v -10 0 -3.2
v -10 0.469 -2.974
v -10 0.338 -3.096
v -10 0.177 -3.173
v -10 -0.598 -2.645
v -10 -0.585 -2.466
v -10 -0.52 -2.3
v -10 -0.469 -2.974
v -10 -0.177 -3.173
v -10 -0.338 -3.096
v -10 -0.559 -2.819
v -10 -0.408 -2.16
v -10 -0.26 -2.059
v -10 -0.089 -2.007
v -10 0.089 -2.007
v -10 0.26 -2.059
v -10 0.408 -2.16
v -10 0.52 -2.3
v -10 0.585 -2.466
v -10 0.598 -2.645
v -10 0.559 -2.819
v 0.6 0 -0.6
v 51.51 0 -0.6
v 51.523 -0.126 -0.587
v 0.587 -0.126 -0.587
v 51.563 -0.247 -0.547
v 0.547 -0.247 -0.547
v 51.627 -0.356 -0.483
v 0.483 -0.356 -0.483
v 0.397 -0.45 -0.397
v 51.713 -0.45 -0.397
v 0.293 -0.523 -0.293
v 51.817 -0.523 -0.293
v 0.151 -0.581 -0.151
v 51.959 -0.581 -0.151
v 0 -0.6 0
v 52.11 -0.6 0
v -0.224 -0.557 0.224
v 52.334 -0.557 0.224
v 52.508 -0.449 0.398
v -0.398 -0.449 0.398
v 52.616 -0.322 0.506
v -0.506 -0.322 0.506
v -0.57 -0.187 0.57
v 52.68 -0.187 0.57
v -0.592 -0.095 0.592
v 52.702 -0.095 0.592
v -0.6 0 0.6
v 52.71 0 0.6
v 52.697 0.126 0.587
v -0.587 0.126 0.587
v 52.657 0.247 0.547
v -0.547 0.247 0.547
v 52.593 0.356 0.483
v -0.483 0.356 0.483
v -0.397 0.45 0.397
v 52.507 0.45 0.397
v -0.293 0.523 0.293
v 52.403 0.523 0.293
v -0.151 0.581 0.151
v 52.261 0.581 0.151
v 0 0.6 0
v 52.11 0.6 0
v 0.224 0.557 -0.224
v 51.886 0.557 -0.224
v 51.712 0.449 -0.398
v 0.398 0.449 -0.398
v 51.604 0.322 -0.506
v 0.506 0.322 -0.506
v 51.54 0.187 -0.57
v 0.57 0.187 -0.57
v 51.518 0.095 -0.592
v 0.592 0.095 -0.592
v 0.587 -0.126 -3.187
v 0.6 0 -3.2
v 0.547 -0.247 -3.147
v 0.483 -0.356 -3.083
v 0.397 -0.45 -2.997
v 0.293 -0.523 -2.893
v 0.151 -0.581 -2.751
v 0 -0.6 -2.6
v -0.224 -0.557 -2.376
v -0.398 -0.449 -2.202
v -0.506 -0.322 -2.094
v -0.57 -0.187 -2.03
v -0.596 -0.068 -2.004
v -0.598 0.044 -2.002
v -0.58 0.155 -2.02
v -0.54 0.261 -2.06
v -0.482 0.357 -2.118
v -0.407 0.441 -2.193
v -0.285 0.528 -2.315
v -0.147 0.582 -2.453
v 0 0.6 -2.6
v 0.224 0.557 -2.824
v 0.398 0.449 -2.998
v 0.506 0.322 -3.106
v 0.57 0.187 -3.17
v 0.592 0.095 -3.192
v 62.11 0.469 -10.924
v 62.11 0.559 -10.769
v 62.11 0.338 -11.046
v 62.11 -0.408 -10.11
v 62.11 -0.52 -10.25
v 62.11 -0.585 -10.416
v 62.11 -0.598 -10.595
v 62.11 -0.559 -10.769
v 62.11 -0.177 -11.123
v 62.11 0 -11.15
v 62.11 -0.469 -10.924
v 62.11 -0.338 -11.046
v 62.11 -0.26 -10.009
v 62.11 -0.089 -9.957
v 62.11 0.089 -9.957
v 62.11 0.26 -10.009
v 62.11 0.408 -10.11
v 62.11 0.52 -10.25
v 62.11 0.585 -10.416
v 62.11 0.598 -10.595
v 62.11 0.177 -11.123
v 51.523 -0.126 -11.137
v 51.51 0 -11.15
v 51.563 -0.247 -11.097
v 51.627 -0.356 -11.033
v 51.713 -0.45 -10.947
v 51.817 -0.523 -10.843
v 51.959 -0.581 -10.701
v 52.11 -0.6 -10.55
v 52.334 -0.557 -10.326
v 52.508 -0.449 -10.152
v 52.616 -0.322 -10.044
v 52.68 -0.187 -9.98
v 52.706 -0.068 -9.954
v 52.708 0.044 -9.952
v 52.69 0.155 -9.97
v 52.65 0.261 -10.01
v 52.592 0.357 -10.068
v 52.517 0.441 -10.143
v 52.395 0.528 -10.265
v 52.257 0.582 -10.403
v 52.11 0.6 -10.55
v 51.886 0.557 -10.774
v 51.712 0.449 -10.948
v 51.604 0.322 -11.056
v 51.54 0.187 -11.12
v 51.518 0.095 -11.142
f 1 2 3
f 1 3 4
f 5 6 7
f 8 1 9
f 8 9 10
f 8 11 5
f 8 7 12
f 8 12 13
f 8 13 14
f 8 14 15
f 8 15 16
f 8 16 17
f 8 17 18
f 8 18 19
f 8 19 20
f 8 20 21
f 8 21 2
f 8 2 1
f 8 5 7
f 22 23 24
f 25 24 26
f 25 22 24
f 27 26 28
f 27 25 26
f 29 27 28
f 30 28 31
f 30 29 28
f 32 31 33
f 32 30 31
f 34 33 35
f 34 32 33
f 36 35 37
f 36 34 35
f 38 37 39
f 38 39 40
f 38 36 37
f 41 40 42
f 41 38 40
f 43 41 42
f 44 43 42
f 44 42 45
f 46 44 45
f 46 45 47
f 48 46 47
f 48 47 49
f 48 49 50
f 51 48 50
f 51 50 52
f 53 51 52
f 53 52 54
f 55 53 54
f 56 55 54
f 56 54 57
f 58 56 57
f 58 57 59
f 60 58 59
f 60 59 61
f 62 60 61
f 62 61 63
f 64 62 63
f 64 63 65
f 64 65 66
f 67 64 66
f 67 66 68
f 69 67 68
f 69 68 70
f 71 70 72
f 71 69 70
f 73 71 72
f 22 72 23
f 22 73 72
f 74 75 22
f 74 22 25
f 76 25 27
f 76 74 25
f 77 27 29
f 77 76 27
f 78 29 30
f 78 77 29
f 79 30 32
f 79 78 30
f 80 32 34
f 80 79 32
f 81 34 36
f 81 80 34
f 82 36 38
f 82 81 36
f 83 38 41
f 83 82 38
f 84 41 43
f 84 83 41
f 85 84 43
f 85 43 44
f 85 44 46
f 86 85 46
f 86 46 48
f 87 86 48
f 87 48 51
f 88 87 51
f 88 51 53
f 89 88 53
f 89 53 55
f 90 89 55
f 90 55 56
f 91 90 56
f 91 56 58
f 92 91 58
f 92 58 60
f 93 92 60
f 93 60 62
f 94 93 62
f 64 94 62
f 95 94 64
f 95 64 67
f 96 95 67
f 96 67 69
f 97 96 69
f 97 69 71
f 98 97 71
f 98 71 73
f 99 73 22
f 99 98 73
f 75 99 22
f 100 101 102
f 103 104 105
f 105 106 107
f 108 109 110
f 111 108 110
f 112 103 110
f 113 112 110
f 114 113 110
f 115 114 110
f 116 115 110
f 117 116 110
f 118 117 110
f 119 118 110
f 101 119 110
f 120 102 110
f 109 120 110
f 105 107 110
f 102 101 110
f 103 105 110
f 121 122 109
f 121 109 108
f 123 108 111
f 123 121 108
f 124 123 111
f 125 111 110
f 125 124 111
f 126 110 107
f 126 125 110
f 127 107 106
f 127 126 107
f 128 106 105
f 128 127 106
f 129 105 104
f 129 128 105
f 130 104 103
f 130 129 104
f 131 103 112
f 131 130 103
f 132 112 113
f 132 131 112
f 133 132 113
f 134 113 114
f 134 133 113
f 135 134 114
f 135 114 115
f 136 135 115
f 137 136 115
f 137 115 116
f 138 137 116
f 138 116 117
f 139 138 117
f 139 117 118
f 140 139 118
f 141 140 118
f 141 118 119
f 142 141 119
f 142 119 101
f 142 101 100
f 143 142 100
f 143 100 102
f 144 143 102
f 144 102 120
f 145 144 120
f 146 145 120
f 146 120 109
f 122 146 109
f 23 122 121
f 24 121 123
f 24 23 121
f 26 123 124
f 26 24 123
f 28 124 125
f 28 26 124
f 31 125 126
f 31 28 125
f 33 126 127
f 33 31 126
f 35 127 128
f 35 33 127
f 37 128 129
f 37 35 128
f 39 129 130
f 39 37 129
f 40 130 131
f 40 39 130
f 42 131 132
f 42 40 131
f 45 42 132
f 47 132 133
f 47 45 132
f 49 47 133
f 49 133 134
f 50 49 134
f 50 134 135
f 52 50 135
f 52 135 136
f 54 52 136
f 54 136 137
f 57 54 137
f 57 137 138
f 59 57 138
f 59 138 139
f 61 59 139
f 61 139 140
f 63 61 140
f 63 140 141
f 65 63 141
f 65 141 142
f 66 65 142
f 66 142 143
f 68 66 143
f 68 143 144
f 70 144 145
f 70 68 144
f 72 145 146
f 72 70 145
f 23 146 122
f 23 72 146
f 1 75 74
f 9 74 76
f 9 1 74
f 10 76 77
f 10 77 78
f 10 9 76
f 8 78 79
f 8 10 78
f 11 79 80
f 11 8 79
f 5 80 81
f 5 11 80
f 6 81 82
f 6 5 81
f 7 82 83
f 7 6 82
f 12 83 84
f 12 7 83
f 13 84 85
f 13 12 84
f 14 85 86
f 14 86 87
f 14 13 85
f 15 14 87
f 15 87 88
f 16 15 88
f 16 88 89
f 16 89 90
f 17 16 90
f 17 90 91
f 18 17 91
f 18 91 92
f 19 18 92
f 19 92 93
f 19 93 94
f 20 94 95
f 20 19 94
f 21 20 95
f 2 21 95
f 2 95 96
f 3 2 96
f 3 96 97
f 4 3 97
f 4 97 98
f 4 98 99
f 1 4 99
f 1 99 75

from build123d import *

# Parameters (mm, degrees)
SWEEP1_PROFILE_R = 0.6


with BuildPart() as part:
    # Sweep1: sweep along a path in Sketch1
    with BuildLine(Plane(origin=(0, 0, 0), x_dir=(1, 0, 0), z_dir=(0, 1, 0))) as sweep1_path:
        Line((62.11, 10.55), (52.11, 10.55))
        Line((52.11, 10.55), (52.11, 0))
        Line((52.11, 0), (0, 0))
        Line((0, 0), (0, 2.6))
        Line((0, 2.6), (-10, 2.6))
    # Sweep1 profile (on start of the path) → Sweep1 (sweep)
    with BuildSketch(Plane(origin=(62.11, 0, -10.55), x_dir=(0, 0, -1), z_dir=(-1, 0, 0))):
        Circle(SWEEP1_PROFILE_R)
    sweep(path=sweep1_path.line, transition=Transition.RIGHT)


solid = part.part
